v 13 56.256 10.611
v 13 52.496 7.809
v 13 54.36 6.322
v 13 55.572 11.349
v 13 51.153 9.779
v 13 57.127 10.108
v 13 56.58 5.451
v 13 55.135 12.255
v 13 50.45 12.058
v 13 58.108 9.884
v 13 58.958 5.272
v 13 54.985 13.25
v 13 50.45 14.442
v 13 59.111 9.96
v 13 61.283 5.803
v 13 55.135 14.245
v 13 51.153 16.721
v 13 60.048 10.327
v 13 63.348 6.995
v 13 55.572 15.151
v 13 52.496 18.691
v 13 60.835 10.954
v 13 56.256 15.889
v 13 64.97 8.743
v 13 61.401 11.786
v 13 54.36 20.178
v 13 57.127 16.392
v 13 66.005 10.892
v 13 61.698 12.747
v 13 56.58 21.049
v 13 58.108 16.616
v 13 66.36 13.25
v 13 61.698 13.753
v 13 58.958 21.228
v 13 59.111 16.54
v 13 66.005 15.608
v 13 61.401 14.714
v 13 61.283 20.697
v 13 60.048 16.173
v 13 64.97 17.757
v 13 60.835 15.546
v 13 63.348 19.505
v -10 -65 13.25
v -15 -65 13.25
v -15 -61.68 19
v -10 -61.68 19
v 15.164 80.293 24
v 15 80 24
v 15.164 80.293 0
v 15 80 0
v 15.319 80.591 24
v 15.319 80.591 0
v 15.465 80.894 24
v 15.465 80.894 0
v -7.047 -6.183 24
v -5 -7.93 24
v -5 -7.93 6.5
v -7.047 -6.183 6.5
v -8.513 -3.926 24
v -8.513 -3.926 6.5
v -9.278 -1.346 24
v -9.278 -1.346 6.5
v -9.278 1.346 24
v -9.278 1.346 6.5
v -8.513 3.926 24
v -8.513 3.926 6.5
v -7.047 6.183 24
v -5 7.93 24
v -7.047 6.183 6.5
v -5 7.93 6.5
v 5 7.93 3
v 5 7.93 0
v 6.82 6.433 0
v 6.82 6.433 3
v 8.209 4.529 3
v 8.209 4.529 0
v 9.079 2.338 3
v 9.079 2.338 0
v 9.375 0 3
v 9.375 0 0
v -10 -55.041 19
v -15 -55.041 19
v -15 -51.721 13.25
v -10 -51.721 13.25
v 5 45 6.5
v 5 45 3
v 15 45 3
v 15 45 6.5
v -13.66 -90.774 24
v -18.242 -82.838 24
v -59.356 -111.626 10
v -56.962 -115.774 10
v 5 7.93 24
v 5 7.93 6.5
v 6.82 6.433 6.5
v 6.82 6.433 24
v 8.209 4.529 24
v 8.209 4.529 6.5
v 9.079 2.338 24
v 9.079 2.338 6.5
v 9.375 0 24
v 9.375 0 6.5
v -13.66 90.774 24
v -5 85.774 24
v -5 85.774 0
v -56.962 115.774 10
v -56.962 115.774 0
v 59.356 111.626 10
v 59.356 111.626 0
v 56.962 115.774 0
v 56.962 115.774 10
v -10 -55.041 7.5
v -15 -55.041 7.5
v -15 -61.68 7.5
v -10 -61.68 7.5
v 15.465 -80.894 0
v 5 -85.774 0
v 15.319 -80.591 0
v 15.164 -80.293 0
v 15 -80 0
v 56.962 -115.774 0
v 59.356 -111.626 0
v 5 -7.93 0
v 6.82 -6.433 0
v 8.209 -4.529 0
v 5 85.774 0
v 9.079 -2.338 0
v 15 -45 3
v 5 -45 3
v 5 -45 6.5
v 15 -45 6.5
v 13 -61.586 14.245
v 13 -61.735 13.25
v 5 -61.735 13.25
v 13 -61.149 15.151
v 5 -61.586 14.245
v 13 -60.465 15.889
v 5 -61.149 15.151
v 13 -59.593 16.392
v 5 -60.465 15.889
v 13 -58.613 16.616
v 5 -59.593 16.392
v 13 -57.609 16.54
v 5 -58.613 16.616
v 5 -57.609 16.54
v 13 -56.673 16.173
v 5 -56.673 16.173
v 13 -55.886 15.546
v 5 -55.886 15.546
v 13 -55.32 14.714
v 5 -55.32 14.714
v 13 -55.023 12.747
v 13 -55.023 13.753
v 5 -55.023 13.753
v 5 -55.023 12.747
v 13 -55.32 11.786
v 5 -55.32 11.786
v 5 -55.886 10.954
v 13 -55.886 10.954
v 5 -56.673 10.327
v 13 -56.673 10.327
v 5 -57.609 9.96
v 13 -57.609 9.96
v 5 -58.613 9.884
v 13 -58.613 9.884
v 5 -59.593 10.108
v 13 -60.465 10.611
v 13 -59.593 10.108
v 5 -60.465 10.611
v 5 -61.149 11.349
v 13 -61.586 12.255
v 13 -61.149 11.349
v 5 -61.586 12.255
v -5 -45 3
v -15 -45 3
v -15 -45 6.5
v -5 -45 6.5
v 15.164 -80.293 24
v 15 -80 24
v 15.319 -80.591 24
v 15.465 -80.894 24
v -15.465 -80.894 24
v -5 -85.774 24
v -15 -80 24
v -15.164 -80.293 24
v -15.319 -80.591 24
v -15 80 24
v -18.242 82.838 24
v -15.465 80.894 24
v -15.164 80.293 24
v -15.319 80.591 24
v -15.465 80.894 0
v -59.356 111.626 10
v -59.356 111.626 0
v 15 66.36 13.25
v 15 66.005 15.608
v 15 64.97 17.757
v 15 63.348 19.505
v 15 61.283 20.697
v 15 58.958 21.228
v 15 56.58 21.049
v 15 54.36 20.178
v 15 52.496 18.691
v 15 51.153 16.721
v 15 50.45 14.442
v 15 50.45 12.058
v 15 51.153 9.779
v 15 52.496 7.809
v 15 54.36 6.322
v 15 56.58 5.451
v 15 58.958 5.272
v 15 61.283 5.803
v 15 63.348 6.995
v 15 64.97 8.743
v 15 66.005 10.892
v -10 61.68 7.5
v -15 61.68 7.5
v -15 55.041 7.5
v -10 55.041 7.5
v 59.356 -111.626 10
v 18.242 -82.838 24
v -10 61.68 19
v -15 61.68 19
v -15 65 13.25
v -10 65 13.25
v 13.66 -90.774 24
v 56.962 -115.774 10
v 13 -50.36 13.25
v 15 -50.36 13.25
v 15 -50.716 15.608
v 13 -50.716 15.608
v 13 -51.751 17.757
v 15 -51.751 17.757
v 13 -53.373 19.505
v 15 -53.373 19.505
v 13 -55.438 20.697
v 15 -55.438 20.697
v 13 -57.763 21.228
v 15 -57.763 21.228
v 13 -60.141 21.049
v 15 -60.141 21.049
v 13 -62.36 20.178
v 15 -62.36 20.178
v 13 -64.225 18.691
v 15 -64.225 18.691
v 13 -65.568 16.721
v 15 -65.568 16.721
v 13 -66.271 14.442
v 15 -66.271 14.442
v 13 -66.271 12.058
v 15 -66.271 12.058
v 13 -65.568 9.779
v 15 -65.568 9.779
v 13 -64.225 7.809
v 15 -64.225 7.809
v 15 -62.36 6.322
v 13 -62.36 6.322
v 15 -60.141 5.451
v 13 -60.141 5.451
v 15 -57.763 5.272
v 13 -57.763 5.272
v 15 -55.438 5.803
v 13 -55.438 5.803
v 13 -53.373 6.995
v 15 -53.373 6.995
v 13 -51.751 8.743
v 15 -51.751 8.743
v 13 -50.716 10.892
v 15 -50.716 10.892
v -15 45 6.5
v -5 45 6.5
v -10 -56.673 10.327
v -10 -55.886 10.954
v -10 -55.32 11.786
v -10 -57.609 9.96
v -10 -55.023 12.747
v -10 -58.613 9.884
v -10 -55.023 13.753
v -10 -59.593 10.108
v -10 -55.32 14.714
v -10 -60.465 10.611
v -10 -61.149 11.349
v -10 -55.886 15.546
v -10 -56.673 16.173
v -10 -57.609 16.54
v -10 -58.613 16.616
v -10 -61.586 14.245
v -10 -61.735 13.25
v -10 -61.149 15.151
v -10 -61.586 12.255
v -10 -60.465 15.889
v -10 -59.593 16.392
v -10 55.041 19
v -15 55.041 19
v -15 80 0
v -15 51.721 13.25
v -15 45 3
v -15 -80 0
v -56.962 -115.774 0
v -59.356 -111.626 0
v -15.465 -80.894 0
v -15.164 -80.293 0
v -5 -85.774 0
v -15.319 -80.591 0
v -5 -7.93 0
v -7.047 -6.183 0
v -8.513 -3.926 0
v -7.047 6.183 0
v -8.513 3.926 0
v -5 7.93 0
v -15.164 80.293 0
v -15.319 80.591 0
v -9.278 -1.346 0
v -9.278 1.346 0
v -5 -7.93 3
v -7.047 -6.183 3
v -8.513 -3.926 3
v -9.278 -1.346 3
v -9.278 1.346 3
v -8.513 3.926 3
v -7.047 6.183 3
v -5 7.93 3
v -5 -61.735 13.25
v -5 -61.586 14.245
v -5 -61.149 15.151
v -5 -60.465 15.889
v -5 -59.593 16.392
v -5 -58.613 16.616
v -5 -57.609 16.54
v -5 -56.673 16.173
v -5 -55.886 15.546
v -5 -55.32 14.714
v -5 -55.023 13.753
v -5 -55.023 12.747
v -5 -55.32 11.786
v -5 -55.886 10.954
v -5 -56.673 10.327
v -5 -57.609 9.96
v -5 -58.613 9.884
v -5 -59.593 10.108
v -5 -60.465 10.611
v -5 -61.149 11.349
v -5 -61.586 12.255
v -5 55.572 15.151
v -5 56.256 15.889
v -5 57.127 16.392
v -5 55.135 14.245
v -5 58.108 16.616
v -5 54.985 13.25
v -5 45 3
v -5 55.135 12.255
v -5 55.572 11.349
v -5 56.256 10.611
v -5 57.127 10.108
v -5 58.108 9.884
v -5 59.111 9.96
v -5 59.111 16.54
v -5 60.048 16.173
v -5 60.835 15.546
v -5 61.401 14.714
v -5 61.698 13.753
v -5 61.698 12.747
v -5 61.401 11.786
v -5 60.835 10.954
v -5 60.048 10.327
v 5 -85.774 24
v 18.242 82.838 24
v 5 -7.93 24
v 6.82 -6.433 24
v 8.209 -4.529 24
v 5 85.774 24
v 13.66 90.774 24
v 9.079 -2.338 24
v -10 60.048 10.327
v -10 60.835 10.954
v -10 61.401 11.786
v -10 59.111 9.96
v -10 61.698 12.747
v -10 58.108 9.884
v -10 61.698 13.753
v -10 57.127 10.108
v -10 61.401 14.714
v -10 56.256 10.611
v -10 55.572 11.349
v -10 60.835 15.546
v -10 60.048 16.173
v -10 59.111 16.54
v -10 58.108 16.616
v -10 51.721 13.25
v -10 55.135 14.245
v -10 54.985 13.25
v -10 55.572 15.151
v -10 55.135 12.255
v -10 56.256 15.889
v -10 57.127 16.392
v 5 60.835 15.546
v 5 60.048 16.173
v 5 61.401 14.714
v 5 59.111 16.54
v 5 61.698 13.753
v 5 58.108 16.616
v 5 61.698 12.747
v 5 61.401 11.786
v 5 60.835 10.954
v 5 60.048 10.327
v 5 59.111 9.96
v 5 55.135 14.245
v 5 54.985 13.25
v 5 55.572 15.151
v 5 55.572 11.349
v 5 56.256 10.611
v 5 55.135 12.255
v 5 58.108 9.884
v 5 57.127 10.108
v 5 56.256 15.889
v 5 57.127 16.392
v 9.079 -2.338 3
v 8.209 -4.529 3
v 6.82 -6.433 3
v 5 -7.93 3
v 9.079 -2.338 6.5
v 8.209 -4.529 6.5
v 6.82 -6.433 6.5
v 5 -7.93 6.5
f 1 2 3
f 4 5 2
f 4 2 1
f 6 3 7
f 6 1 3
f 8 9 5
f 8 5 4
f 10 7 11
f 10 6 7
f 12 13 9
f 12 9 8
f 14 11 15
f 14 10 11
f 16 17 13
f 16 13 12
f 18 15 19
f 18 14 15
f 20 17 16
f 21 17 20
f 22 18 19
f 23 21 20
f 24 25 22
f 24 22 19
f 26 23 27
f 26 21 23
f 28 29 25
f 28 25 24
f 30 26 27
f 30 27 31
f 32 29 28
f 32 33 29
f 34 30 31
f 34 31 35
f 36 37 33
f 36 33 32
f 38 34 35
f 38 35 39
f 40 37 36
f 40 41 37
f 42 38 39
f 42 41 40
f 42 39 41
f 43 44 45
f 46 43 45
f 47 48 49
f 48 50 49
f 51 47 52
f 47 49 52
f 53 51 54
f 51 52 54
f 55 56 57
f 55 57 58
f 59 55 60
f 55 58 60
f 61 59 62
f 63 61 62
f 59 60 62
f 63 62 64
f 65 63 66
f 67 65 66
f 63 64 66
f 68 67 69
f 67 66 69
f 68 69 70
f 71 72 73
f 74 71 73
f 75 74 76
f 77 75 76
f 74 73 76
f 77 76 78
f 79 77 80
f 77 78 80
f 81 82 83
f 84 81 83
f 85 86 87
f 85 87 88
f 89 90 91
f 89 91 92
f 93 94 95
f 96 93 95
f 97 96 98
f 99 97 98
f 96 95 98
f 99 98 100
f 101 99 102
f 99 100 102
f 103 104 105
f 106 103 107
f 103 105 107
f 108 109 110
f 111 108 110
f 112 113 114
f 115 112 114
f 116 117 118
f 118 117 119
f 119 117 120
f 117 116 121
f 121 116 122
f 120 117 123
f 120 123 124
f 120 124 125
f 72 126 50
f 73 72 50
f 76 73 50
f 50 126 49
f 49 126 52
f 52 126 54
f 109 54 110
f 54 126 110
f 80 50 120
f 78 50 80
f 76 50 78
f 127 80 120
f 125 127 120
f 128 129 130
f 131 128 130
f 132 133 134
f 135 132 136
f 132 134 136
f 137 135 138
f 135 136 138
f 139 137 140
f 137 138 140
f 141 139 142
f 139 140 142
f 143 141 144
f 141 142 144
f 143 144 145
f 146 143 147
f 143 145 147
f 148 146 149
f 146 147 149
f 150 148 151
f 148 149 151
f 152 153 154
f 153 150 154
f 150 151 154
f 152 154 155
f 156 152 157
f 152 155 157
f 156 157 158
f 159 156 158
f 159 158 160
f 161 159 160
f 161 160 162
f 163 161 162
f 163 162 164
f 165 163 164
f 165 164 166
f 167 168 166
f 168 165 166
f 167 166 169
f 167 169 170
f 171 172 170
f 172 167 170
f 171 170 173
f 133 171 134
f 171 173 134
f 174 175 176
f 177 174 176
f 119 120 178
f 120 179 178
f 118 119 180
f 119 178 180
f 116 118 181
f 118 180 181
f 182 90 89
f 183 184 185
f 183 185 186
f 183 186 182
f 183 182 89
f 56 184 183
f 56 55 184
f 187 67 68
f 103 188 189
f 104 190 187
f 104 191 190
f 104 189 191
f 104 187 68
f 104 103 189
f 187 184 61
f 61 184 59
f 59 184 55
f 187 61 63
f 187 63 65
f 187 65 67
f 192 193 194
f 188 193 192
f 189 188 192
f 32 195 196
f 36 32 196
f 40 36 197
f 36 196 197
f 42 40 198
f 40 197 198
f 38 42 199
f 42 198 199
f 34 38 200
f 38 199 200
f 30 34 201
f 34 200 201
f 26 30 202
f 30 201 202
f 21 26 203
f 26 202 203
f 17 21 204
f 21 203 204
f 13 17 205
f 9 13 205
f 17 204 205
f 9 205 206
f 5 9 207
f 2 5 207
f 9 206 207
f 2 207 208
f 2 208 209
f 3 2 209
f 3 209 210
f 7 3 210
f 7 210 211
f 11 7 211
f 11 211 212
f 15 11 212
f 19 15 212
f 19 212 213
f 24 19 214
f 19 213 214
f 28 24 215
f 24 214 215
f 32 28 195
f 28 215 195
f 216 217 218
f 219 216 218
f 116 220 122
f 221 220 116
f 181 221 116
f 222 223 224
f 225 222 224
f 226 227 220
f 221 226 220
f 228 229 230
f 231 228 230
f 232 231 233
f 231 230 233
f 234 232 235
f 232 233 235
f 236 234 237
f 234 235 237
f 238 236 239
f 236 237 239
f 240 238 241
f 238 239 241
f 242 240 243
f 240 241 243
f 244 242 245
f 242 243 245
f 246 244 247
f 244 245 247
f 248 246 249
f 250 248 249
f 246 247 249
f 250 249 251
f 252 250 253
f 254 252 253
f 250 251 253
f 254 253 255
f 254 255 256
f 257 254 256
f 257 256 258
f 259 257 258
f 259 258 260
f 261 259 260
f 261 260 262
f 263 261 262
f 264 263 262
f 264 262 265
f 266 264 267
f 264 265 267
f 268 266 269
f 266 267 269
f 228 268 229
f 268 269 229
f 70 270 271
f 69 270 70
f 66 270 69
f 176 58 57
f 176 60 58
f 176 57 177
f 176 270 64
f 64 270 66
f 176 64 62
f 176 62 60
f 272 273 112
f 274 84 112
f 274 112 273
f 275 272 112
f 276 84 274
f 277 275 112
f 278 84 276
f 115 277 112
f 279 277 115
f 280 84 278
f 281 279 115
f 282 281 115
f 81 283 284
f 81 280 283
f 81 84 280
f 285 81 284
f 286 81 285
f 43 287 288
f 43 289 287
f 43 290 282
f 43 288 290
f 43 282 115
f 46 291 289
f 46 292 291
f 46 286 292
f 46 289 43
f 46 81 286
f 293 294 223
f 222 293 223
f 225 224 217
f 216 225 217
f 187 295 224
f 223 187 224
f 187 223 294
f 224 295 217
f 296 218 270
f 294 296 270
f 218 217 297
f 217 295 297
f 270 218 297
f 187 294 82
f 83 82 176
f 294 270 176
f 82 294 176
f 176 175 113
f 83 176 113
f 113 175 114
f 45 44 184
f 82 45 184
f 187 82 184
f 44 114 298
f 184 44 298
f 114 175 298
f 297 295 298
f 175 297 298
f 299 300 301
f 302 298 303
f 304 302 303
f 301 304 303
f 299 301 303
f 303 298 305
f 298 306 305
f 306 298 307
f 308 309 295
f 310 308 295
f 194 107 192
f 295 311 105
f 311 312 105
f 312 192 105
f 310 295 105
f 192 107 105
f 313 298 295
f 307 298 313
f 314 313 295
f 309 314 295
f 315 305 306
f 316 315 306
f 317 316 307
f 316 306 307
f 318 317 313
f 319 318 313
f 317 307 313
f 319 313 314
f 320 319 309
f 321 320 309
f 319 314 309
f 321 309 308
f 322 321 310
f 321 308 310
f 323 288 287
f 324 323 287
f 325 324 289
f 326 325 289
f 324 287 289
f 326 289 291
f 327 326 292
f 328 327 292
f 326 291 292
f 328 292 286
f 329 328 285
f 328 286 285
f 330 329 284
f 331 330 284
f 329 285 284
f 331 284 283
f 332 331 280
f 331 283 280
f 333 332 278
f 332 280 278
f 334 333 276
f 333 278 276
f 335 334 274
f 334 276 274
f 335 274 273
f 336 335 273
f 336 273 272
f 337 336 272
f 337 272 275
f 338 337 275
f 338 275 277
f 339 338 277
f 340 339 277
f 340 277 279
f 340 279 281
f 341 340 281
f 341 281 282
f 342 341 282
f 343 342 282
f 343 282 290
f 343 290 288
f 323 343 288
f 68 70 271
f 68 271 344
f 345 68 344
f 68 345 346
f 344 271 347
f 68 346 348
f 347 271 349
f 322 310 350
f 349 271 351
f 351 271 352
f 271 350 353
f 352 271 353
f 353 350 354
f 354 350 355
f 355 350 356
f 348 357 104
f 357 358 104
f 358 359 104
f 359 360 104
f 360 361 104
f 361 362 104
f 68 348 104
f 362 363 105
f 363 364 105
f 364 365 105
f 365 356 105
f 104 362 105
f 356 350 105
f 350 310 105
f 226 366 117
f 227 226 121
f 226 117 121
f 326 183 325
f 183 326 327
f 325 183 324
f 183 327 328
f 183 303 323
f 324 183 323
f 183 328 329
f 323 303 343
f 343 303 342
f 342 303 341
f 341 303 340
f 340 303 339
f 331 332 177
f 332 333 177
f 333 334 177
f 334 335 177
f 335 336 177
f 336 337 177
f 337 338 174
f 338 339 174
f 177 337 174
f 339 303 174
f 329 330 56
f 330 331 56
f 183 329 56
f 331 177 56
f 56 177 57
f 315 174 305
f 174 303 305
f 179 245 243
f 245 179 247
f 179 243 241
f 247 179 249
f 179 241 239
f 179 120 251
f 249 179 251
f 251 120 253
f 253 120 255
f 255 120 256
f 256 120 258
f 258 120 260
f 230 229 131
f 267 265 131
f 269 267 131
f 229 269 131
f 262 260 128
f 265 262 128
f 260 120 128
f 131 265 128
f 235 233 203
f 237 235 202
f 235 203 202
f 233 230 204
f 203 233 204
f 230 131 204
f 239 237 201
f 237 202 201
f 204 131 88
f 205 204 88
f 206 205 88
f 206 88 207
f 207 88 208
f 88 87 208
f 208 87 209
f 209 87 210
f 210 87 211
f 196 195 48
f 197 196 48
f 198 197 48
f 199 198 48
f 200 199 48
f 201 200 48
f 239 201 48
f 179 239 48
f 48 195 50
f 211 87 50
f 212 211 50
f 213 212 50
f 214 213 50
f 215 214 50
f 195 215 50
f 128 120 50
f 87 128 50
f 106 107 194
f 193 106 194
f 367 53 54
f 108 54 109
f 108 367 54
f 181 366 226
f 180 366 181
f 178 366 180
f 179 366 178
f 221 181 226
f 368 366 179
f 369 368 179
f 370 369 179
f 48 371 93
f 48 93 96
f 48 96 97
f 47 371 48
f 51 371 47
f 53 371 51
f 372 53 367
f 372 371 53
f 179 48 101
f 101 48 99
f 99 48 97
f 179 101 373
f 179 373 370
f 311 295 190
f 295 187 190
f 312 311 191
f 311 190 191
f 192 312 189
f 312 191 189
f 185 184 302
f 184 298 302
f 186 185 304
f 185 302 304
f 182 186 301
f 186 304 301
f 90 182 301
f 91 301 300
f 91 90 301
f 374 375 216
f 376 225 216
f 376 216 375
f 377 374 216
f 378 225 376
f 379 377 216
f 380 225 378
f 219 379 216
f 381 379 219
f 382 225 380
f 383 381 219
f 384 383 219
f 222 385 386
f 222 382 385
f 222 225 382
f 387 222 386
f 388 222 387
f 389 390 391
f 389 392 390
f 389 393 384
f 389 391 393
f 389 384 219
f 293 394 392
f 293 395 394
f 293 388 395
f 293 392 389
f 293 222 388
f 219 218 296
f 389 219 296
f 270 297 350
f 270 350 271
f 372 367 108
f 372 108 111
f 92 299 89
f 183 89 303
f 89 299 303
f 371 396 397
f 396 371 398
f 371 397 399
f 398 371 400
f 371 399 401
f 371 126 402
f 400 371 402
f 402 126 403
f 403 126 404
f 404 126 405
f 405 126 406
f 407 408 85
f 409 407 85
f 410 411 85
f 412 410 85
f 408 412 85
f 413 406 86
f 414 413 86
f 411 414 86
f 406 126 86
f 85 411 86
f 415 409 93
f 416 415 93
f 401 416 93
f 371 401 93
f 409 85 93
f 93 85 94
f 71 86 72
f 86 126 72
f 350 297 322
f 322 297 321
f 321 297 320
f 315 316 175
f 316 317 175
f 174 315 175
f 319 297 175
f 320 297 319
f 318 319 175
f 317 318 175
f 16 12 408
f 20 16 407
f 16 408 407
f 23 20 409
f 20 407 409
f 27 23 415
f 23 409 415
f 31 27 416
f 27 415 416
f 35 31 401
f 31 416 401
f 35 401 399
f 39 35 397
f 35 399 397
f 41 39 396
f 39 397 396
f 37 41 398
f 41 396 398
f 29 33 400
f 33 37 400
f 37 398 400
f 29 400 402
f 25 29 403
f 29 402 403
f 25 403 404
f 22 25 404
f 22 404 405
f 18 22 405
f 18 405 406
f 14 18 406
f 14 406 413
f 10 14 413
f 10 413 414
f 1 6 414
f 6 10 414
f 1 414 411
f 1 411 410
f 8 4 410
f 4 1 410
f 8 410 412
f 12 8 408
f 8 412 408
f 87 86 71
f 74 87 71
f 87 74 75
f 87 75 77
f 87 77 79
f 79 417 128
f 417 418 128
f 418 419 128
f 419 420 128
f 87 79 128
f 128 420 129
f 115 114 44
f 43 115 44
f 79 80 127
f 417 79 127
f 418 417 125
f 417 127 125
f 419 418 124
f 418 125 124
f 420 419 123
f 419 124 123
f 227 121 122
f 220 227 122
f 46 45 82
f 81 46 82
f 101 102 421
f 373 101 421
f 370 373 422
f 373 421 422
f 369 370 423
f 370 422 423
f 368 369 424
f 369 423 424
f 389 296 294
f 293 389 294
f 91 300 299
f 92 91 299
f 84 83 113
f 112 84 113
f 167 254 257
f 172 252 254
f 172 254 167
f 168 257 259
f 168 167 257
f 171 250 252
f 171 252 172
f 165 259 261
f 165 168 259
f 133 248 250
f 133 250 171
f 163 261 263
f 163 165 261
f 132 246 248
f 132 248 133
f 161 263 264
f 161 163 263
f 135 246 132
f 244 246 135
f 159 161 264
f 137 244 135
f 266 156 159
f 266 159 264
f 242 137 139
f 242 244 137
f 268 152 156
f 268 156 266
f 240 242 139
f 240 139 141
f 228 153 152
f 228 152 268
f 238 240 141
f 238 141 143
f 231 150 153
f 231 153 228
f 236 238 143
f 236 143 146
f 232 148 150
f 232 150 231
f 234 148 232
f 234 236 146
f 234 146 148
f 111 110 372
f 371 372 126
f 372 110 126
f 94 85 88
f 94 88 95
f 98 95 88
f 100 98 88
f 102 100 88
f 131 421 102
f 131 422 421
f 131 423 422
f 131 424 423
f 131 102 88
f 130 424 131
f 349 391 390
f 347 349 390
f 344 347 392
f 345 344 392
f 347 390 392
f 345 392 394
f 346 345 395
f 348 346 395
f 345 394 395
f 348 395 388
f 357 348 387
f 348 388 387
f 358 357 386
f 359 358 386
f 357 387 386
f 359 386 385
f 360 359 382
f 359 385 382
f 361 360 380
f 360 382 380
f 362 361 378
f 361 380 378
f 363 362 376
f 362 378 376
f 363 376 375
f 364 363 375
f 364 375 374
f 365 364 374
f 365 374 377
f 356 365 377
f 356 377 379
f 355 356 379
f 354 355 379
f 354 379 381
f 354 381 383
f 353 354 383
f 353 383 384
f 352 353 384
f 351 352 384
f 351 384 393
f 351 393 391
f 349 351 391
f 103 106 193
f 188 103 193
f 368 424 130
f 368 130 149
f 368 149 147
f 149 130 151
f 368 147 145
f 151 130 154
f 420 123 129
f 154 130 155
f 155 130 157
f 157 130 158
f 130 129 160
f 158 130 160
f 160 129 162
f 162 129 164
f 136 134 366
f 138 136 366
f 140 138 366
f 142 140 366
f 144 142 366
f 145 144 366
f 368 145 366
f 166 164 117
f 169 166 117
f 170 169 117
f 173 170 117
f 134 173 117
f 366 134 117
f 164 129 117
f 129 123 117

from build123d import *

# Parameters (mm, degrees)
F4_DEPTH    = 24
F5_W        = 90
F5_H        = 3.5
F5_R        = 3.375
F6_DEPTH    = 76.9625242271
F7_DEPTH    = 5
F8_R        = 8
F8_R_2      = 3.375
F9_DEPTH    = 2
F10_SIZE2   = 14
F10_SIZE    = 50
F10_2_SIZE2 = 14
F10_2_SIZE  = 50
F11_ANGLE   = 5
F12_ANGLE   = 5
F13_ANGLE   = 5
F14_ANGLE   = 5


# Not quite as in the source:
# - a feature of the source that left no trace in its solid (it failed there, or was rolled back) is left out


with BuildPart() as f4:
    # F3 (on Top) → F4 (new body)
    with BuildSketch(Plane.XY):
        Polygon((-61.9615242271, 107.1132486541), (-15, 80), (-5, 80), (-5, 85.7735026919), (-56.9615242271, 115.7735026919), align=None)
        with BuildLine():
            Line((-15, 80), (-15, -80))
            Line((-15, -80), (-5, -80))
            Line((-5, -80), (-5, -7.9303609628))
            ThreePointArc((-5, -7.9303609628), (-9.375, 0), (-5, 7.9303609628))
            Line((-5, 7.9303609628), (-5, 80))
            Line((-5, 80), (-15, 80))
        make_face()
        Polygon((-5, -80), (-15, -80), (-61.9615242271, -107.1132486541), (-56.9615242271, -115.7735026919), (-5, -85.7735026919), align=None)
    extrude(amount=F4_DEPTH)


with BuildPart() as f4b:
    # F3 (on Top) → F4, piece 2 (new body)
    with BuildSketch(Plane.XY):
        Polygon((15, -80), (5, -80), (5, -85.7735026919), (56.9615242271, -115.7735026919), (61.9615242271, -107.1132486541), align=None)
        with BuildLine():
            ThreePointArc((9.375, 0), (8.2087034604, -4.5285552332), (5, -7.9303609628))
            Line((5, -7.9303609628), (5, -80))
            Line((5, -80), (15, -80))
            Line((15, -80), (15, 80))
            Line((15, 80), (5, 80))
            Line((5, 80), (5, 7.9303609628))
            ThreePointArc((5, 7.9303609628), (8.2087034604, 4.5285552332), (9.375, 0))
        make_face()
        Polygon((5, 85.7735026919), (5, 80), (15, 80), (61.9615242271, 107.1132486541), (56.9615242271, 115.7735026919), align=None)
    extrude(amount=F4_DEPTH)


with BuildPart() as f6_tool:
    # F5 (on face) → F6 (new body, through all)
    with BuildSketch(Plane(origin=(-15, 0, 0), x_dir=(0, -1, 0), z_dir=(-1, 0, 0))):
        with Locations((0, 4.75)):
            Rectangle(F5_W, F5_H)
        with Locations((-58.3604719043, 13.25)):
            Circle(F5_R)
        with Locations((58.3604719043, 13.25)):
            Circle(F5_R)
    extrude(amount=-F6_DEPTH)


with BuildPart() as f4_1:
    add(f4.part)

    # F6: cut by f6_tool
    add(f6_tool.part, mode=Mode.SUBTRACT)

    # F5 (on face) → F7 (cut)
    with BuildSketch(Plane(origin=(-15, 0, 0), x_dir=(0, -1, 0), z_dir=(-1, 0, 0))):
        Polygon((65, 13.25), (61.6802359522, 19), (55.0407078565, 19), (51.7209438086, 13.25), (55.0407078565, 7.5), (61.6802359522, 7.5), align=None)
        with Locations((58.3604719043, 13.25)):
            Circle(F5_R, mode=Mode.SUBTRACT)
        Polygon((-51.7209438086, 13.25), (-55.0407078565, 19), (-61.6802359522, 19), (-65, 13.25), (-61.6802359522, 7.5), (-55.0407078565, 7.5), align=None)
        with Locations((-58.3604719043, 13.25)):
            Circle(F5_R, mode=Mode.SUBTRACT)
    extrude(amount=-F7_DEPTH, mode=Mode.SUBTRACT)

    # F10
    f10_edges = [f4_1.edges().sort_by_distance(p)[0] for p in [
        (-59.461524, -111.443376, 24),
        (-59.461524, 111.443376, 24),
    ]]
    f10_side = f4_1.faces().sort_by_distance((-37.28851, 95.621666, 24))[0]
    chamfer(f10_edges, length=F10_SIZE, length2=F10_SIZE2, reference=f10_side)

    # F4_face2 (on face) → F11 (revolve, cut)
    with BuildSketch(Plane(origin=(-35.1526852914, 91.6351582779, 9.3023231821), x_dir=(0.8660254038, -0.5, 0), z_dir=(-0.5, -0.8660254038, 0))):
        Polygon((-30.9561807523, 0.6976768179), (-30.9561807523, -9.3023231821), (23.2703165558, -9.3023231821), (23.2703165558, 14.6976768179), (19.0438192477, 14.6976768179), align=None)
    revolve(axis=Axis((-5, 85.7735026919, 12), (0, 0, -1)), revolution_arc=F11_ANGLE, mode=Mode.SUBTRACT)

    # F4_face5 (on face) → F14 (revolve, cut)
    with BuildSketch(Plane(origin=(-35.1526852914, -91.6351582779, 9.3023231821), x_dir=(-0.8660254038, -0.5, 0), z_dir=(-0.5, 0.8660254038, 0))):
        Polygon((30.9561807523, -9.3023231821), (30.9561807523, 0.6976768179), (-19.0438192477, 14.6976768179), (-23.2703165558, 14.6976768179), (-23.2703165558, -9.3023231821), align=None)
    revolve(axis=Axis((-5, -85.7735026919, 12), (0, 0, 1)), revolution_arc=F14_ANGLE, mode=Mode.SUBTRACT)


with BuildPart() as f4b_1:
    add(f4b.part)

    # F6: cut by f6_tool
    add(f6_tool.part, mode=Mode.SUBTRACT)

    # F8 (on face) → F9 (cut)
    with BuildSketch(Plane.YZ.offset(15)):
        with Locations((-58.3604719043, 13.25)):
            Circle(F8_R)
        with Locations((-58.3604719043, 13.25)):
            Circle(F8_R_2, mode=Mode.SUBTRACT)
        with Locations((58.3604719043, 13.25)):
            Circle(F8_R)
        with Locations((58.3604719043, 13.25)):
            Circle(F8_R_2, mode=Mode.SUBTRACT)
    extrude(amount=-F9_DEPTH, mode=Mode.SUBTRACT)

    # F10#2
    f10_2_edges = [f4b_1.edges().sort_by_distance(p)[0] for p in [
        (59.461524, 111.443376, 24),
        (59.461524, -111.443376, 24),
    ]]
    f10_2_side = f4b_1.faces().sort_by_distance((37.28851, -95.621666, 24))[0]
    chamfer(f10_2_edges, length=F10_2_SIZE, length2=F10_2_SIZE2, reference=f10_2_side)

    # F4_face3 (on face) → F12 (revolve, cut)
    with BuildSketch(Plane(origin=(35.1526852914, 91.6351582779, 9.3023231821), x_dir=(0.8660254038, 0.5, 0), z_dir=(0.5, -0.8660254038, 0))):
        Polygon((30.9561807523, -9.3023231821), (30.9561807523, 0.6976768179), (-19.0438192477, 14.6976768179), (-23.2703165558, 14.6976768179), (-23.2703165558, -9.3023231821), align=None)
    revolve(axis=Axis((5, 85.7735026919, 12), (0, 0, 1)), revolution_arc=F12_ANGLE, mode=Mode.SUBTRACT)

    # F4_face4 (on face) → F13 (revolve, cut)
    with BuildSketch(Plane(origin=(35.1526852914, -91.6351582779, 9.3023231821), x_dir=(-0.8660254038, 0.5, 0), z_dir=(0.5, 0.8660254038, 0))):
        Polygon((-30.9561807523, 0.6976768179), (-30.9561807523, -9.3023231821), (23.2703165558, -9.3023231821), (23.2703165558, 14.6976768179), (19.0438192477, 14.6976768179), align=None)
    revolve(axis=Axis((5, -85.7735026919, 12), (0, 0, -1)), revolution_arc=F13_ANGLE, mode=Mode.SUBTRACT)


solid = Compound([f4_1.part, f4b_1.part])
